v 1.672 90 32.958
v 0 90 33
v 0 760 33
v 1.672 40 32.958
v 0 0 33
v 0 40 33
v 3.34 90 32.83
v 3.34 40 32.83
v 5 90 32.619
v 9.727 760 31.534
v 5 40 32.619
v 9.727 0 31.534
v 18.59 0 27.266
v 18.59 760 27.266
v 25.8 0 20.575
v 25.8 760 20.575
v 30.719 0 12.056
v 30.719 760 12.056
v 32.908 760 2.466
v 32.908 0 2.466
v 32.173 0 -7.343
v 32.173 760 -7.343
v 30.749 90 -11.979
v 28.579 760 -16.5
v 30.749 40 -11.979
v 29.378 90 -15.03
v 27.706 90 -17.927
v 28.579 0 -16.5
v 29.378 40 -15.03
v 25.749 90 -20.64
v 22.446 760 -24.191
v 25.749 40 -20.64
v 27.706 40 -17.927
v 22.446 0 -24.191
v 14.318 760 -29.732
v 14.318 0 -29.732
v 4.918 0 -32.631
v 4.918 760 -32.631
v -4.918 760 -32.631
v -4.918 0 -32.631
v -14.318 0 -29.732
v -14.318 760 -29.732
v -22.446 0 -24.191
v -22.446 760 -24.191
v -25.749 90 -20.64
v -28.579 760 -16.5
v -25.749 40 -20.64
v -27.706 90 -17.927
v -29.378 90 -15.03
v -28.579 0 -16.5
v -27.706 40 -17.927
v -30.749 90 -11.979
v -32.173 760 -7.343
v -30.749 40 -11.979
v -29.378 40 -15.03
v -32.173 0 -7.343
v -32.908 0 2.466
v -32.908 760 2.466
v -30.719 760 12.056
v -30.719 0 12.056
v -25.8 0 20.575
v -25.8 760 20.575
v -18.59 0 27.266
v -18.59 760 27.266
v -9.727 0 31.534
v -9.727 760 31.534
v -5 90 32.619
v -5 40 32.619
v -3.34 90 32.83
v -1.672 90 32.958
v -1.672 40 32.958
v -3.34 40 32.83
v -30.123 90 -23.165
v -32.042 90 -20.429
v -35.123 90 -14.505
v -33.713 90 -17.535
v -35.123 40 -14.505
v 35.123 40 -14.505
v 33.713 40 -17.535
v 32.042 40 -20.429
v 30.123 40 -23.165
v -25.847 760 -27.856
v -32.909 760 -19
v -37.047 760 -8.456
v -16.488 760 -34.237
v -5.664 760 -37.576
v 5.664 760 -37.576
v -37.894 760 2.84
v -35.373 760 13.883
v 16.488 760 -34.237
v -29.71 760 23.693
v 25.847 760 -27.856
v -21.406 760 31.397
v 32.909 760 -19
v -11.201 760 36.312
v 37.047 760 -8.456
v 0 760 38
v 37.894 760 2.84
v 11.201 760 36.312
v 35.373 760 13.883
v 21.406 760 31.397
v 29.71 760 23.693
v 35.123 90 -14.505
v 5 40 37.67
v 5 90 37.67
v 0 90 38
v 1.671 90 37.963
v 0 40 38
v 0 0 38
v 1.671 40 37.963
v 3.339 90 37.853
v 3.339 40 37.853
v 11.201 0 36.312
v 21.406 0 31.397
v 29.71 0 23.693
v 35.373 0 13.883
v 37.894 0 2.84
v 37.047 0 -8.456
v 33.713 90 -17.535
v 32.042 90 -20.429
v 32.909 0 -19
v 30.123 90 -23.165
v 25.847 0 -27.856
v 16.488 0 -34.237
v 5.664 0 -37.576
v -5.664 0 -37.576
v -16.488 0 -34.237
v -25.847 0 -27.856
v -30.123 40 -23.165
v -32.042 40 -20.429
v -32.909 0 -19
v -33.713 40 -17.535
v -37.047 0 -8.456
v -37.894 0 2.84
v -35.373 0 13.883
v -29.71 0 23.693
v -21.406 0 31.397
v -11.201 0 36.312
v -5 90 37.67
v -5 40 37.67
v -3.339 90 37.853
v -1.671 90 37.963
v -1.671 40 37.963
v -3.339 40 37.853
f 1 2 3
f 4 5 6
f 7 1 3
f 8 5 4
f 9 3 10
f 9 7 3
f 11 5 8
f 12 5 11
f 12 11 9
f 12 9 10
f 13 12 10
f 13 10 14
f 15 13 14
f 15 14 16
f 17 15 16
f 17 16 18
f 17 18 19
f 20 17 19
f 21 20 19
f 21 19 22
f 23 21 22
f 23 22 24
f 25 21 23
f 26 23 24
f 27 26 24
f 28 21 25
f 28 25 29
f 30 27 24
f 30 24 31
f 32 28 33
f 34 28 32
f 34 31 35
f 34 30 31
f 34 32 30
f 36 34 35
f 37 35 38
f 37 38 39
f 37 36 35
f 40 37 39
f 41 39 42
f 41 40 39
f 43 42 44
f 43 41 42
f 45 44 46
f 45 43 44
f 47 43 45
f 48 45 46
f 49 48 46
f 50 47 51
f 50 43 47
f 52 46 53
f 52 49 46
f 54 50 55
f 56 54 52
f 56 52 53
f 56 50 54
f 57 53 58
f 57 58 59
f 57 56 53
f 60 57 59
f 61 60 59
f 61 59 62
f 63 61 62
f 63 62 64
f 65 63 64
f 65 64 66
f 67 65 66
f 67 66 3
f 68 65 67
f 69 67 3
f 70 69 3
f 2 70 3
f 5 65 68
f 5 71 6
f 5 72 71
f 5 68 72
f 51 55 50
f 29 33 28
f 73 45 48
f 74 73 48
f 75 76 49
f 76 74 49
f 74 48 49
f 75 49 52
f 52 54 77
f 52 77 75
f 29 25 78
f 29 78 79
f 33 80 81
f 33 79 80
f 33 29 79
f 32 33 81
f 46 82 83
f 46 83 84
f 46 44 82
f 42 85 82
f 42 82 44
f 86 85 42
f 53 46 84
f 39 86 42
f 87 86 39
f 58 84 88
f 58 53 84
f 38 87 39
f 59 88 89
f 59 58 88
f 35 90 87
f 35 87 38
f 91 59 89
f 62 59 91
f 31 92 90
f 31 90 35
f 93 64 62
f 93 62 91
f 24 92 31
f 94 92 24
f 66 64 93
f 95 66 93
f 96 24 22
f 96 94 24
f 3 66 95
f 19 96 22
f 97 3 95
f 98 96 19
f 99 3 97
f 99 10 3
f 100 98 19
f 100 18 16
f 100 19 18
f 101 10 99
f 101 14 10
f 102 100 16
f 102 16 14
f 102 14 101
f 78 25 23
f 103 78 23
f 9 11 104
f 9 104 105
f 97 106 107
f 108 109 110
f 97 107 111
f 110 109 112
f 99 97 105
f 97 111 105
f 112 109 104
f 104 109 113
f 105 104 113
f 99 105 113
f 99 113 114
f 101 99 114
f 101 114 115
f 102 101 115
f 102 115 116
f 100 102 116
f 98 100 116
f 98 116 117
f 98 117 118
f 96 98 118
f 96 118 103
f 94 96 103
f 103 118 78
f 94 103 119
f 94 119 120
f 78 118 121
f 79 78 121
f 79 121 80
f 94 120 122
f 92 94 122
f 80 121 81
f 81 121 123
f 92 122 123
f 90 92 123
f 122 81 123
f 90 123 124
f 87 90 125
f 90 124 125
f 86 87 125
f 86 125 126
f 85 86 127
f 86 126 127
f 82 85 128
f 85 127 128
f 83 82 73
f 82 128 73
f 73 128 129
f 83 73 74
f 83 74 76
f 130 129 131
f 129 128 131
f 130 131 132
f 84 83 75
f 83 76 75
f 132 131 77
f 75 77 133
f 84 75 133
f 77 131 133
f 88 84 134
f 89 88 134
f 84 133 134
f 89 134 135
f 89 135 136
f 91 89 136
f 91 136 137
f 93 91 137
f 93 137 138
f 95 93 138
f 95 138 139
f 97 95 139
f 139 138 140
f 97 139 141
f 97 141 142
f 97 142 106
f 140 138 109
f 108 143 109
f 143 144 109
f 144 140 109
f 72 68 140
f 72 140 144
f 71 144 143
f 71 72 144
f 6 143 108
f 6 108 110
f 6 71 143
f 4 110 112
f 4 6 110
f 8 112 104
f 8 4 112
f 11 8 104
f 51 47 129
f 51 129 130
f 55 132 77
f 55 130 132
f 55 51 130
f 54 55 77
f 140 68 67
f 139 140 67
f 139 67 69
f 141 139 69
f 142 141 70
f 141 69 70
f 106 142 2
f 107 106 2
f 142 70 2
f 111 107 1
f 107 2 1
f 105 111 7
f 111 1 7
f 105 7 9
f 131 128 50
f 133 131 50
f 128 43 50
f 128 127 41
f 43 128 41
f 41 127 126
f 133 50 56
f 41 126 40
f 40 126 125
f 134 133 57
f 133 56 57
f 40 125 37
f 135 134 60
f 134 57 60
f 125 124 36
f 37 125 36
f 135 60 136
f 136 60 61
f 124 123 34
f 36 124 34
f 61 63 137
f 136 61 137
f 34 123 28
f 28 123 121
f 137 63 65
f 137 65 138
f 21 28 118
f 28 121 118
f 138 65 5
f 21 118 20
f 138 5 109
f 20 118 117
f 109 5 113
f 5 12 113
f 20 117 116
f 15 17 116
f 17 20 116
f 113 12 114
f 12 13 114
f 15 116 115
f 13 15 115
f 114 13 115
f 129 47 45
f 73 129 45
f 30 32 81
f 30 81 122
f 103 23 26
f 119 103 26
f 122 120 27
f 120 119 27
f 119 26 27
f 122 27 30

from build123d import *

# Parameters (mm, degrees)
SKETCH1_R           = 3.8
SKETCH1_R_2         = 3.3
BOSS_EXTRUDE2_DEPTH = 76
SKETCH2_W           = 1
SKETCH2_H           = 5
CUT_EXTRUDE4_DEPTH  = 8
CIRPATTERN1_COUNT   = 3
SCALE2_SCALE        = 10


with BuildPart() as part:
    # Sketch1 → Boss-Extrude2 (new body)
    with BuildSketch(Plane(origin=(0, 0, 0), x_dir=(1, 0, 0), z_dir=(0, 1, 0))):
        with Locations(Location((0, 0, 0), (0, 0, 270))):
            Circle(SKETCH1_R)
        with Locations(Location((0, 0, 0), (0, 0, 270))):
            Circle(SKETCH1_R_2, mode=Mode.SUBTRACT)
    extrude(amount=BOSS_EXTRUDE2_DEPTH)

    # Sketch2 → Cut-Extrude4 (cut)
    with BuildSketch(Plane.XY):
        with Locations((0, 6.5)):
            Rectangle(SKETCH2_W, SKETCH2_H)
    cut_extrude4 = extrude(amount=CUT_EXTRUDE4_DEPTH, mode=Mode.SUBTRACT)

    # CirPattern1: Cut-Extrude4 ×3 about axis
    cirpattern1_axis = Axis((0, 0, 0), (0, 1, 0))
    for i in range(1, CIRPATTERN1_COUNT):
        add(cut_extrude4.rotate(cirpattern1_axis, i * 360 / CIRPATTERN1_COUNT), mode=Mode.SUBTRACT)


with BuildPart() as part_1:
    # Scale2: scaled about (0, 0, 0)
    add(part.part.scale(SCALE2_SCALE))


solid = part_1.part
